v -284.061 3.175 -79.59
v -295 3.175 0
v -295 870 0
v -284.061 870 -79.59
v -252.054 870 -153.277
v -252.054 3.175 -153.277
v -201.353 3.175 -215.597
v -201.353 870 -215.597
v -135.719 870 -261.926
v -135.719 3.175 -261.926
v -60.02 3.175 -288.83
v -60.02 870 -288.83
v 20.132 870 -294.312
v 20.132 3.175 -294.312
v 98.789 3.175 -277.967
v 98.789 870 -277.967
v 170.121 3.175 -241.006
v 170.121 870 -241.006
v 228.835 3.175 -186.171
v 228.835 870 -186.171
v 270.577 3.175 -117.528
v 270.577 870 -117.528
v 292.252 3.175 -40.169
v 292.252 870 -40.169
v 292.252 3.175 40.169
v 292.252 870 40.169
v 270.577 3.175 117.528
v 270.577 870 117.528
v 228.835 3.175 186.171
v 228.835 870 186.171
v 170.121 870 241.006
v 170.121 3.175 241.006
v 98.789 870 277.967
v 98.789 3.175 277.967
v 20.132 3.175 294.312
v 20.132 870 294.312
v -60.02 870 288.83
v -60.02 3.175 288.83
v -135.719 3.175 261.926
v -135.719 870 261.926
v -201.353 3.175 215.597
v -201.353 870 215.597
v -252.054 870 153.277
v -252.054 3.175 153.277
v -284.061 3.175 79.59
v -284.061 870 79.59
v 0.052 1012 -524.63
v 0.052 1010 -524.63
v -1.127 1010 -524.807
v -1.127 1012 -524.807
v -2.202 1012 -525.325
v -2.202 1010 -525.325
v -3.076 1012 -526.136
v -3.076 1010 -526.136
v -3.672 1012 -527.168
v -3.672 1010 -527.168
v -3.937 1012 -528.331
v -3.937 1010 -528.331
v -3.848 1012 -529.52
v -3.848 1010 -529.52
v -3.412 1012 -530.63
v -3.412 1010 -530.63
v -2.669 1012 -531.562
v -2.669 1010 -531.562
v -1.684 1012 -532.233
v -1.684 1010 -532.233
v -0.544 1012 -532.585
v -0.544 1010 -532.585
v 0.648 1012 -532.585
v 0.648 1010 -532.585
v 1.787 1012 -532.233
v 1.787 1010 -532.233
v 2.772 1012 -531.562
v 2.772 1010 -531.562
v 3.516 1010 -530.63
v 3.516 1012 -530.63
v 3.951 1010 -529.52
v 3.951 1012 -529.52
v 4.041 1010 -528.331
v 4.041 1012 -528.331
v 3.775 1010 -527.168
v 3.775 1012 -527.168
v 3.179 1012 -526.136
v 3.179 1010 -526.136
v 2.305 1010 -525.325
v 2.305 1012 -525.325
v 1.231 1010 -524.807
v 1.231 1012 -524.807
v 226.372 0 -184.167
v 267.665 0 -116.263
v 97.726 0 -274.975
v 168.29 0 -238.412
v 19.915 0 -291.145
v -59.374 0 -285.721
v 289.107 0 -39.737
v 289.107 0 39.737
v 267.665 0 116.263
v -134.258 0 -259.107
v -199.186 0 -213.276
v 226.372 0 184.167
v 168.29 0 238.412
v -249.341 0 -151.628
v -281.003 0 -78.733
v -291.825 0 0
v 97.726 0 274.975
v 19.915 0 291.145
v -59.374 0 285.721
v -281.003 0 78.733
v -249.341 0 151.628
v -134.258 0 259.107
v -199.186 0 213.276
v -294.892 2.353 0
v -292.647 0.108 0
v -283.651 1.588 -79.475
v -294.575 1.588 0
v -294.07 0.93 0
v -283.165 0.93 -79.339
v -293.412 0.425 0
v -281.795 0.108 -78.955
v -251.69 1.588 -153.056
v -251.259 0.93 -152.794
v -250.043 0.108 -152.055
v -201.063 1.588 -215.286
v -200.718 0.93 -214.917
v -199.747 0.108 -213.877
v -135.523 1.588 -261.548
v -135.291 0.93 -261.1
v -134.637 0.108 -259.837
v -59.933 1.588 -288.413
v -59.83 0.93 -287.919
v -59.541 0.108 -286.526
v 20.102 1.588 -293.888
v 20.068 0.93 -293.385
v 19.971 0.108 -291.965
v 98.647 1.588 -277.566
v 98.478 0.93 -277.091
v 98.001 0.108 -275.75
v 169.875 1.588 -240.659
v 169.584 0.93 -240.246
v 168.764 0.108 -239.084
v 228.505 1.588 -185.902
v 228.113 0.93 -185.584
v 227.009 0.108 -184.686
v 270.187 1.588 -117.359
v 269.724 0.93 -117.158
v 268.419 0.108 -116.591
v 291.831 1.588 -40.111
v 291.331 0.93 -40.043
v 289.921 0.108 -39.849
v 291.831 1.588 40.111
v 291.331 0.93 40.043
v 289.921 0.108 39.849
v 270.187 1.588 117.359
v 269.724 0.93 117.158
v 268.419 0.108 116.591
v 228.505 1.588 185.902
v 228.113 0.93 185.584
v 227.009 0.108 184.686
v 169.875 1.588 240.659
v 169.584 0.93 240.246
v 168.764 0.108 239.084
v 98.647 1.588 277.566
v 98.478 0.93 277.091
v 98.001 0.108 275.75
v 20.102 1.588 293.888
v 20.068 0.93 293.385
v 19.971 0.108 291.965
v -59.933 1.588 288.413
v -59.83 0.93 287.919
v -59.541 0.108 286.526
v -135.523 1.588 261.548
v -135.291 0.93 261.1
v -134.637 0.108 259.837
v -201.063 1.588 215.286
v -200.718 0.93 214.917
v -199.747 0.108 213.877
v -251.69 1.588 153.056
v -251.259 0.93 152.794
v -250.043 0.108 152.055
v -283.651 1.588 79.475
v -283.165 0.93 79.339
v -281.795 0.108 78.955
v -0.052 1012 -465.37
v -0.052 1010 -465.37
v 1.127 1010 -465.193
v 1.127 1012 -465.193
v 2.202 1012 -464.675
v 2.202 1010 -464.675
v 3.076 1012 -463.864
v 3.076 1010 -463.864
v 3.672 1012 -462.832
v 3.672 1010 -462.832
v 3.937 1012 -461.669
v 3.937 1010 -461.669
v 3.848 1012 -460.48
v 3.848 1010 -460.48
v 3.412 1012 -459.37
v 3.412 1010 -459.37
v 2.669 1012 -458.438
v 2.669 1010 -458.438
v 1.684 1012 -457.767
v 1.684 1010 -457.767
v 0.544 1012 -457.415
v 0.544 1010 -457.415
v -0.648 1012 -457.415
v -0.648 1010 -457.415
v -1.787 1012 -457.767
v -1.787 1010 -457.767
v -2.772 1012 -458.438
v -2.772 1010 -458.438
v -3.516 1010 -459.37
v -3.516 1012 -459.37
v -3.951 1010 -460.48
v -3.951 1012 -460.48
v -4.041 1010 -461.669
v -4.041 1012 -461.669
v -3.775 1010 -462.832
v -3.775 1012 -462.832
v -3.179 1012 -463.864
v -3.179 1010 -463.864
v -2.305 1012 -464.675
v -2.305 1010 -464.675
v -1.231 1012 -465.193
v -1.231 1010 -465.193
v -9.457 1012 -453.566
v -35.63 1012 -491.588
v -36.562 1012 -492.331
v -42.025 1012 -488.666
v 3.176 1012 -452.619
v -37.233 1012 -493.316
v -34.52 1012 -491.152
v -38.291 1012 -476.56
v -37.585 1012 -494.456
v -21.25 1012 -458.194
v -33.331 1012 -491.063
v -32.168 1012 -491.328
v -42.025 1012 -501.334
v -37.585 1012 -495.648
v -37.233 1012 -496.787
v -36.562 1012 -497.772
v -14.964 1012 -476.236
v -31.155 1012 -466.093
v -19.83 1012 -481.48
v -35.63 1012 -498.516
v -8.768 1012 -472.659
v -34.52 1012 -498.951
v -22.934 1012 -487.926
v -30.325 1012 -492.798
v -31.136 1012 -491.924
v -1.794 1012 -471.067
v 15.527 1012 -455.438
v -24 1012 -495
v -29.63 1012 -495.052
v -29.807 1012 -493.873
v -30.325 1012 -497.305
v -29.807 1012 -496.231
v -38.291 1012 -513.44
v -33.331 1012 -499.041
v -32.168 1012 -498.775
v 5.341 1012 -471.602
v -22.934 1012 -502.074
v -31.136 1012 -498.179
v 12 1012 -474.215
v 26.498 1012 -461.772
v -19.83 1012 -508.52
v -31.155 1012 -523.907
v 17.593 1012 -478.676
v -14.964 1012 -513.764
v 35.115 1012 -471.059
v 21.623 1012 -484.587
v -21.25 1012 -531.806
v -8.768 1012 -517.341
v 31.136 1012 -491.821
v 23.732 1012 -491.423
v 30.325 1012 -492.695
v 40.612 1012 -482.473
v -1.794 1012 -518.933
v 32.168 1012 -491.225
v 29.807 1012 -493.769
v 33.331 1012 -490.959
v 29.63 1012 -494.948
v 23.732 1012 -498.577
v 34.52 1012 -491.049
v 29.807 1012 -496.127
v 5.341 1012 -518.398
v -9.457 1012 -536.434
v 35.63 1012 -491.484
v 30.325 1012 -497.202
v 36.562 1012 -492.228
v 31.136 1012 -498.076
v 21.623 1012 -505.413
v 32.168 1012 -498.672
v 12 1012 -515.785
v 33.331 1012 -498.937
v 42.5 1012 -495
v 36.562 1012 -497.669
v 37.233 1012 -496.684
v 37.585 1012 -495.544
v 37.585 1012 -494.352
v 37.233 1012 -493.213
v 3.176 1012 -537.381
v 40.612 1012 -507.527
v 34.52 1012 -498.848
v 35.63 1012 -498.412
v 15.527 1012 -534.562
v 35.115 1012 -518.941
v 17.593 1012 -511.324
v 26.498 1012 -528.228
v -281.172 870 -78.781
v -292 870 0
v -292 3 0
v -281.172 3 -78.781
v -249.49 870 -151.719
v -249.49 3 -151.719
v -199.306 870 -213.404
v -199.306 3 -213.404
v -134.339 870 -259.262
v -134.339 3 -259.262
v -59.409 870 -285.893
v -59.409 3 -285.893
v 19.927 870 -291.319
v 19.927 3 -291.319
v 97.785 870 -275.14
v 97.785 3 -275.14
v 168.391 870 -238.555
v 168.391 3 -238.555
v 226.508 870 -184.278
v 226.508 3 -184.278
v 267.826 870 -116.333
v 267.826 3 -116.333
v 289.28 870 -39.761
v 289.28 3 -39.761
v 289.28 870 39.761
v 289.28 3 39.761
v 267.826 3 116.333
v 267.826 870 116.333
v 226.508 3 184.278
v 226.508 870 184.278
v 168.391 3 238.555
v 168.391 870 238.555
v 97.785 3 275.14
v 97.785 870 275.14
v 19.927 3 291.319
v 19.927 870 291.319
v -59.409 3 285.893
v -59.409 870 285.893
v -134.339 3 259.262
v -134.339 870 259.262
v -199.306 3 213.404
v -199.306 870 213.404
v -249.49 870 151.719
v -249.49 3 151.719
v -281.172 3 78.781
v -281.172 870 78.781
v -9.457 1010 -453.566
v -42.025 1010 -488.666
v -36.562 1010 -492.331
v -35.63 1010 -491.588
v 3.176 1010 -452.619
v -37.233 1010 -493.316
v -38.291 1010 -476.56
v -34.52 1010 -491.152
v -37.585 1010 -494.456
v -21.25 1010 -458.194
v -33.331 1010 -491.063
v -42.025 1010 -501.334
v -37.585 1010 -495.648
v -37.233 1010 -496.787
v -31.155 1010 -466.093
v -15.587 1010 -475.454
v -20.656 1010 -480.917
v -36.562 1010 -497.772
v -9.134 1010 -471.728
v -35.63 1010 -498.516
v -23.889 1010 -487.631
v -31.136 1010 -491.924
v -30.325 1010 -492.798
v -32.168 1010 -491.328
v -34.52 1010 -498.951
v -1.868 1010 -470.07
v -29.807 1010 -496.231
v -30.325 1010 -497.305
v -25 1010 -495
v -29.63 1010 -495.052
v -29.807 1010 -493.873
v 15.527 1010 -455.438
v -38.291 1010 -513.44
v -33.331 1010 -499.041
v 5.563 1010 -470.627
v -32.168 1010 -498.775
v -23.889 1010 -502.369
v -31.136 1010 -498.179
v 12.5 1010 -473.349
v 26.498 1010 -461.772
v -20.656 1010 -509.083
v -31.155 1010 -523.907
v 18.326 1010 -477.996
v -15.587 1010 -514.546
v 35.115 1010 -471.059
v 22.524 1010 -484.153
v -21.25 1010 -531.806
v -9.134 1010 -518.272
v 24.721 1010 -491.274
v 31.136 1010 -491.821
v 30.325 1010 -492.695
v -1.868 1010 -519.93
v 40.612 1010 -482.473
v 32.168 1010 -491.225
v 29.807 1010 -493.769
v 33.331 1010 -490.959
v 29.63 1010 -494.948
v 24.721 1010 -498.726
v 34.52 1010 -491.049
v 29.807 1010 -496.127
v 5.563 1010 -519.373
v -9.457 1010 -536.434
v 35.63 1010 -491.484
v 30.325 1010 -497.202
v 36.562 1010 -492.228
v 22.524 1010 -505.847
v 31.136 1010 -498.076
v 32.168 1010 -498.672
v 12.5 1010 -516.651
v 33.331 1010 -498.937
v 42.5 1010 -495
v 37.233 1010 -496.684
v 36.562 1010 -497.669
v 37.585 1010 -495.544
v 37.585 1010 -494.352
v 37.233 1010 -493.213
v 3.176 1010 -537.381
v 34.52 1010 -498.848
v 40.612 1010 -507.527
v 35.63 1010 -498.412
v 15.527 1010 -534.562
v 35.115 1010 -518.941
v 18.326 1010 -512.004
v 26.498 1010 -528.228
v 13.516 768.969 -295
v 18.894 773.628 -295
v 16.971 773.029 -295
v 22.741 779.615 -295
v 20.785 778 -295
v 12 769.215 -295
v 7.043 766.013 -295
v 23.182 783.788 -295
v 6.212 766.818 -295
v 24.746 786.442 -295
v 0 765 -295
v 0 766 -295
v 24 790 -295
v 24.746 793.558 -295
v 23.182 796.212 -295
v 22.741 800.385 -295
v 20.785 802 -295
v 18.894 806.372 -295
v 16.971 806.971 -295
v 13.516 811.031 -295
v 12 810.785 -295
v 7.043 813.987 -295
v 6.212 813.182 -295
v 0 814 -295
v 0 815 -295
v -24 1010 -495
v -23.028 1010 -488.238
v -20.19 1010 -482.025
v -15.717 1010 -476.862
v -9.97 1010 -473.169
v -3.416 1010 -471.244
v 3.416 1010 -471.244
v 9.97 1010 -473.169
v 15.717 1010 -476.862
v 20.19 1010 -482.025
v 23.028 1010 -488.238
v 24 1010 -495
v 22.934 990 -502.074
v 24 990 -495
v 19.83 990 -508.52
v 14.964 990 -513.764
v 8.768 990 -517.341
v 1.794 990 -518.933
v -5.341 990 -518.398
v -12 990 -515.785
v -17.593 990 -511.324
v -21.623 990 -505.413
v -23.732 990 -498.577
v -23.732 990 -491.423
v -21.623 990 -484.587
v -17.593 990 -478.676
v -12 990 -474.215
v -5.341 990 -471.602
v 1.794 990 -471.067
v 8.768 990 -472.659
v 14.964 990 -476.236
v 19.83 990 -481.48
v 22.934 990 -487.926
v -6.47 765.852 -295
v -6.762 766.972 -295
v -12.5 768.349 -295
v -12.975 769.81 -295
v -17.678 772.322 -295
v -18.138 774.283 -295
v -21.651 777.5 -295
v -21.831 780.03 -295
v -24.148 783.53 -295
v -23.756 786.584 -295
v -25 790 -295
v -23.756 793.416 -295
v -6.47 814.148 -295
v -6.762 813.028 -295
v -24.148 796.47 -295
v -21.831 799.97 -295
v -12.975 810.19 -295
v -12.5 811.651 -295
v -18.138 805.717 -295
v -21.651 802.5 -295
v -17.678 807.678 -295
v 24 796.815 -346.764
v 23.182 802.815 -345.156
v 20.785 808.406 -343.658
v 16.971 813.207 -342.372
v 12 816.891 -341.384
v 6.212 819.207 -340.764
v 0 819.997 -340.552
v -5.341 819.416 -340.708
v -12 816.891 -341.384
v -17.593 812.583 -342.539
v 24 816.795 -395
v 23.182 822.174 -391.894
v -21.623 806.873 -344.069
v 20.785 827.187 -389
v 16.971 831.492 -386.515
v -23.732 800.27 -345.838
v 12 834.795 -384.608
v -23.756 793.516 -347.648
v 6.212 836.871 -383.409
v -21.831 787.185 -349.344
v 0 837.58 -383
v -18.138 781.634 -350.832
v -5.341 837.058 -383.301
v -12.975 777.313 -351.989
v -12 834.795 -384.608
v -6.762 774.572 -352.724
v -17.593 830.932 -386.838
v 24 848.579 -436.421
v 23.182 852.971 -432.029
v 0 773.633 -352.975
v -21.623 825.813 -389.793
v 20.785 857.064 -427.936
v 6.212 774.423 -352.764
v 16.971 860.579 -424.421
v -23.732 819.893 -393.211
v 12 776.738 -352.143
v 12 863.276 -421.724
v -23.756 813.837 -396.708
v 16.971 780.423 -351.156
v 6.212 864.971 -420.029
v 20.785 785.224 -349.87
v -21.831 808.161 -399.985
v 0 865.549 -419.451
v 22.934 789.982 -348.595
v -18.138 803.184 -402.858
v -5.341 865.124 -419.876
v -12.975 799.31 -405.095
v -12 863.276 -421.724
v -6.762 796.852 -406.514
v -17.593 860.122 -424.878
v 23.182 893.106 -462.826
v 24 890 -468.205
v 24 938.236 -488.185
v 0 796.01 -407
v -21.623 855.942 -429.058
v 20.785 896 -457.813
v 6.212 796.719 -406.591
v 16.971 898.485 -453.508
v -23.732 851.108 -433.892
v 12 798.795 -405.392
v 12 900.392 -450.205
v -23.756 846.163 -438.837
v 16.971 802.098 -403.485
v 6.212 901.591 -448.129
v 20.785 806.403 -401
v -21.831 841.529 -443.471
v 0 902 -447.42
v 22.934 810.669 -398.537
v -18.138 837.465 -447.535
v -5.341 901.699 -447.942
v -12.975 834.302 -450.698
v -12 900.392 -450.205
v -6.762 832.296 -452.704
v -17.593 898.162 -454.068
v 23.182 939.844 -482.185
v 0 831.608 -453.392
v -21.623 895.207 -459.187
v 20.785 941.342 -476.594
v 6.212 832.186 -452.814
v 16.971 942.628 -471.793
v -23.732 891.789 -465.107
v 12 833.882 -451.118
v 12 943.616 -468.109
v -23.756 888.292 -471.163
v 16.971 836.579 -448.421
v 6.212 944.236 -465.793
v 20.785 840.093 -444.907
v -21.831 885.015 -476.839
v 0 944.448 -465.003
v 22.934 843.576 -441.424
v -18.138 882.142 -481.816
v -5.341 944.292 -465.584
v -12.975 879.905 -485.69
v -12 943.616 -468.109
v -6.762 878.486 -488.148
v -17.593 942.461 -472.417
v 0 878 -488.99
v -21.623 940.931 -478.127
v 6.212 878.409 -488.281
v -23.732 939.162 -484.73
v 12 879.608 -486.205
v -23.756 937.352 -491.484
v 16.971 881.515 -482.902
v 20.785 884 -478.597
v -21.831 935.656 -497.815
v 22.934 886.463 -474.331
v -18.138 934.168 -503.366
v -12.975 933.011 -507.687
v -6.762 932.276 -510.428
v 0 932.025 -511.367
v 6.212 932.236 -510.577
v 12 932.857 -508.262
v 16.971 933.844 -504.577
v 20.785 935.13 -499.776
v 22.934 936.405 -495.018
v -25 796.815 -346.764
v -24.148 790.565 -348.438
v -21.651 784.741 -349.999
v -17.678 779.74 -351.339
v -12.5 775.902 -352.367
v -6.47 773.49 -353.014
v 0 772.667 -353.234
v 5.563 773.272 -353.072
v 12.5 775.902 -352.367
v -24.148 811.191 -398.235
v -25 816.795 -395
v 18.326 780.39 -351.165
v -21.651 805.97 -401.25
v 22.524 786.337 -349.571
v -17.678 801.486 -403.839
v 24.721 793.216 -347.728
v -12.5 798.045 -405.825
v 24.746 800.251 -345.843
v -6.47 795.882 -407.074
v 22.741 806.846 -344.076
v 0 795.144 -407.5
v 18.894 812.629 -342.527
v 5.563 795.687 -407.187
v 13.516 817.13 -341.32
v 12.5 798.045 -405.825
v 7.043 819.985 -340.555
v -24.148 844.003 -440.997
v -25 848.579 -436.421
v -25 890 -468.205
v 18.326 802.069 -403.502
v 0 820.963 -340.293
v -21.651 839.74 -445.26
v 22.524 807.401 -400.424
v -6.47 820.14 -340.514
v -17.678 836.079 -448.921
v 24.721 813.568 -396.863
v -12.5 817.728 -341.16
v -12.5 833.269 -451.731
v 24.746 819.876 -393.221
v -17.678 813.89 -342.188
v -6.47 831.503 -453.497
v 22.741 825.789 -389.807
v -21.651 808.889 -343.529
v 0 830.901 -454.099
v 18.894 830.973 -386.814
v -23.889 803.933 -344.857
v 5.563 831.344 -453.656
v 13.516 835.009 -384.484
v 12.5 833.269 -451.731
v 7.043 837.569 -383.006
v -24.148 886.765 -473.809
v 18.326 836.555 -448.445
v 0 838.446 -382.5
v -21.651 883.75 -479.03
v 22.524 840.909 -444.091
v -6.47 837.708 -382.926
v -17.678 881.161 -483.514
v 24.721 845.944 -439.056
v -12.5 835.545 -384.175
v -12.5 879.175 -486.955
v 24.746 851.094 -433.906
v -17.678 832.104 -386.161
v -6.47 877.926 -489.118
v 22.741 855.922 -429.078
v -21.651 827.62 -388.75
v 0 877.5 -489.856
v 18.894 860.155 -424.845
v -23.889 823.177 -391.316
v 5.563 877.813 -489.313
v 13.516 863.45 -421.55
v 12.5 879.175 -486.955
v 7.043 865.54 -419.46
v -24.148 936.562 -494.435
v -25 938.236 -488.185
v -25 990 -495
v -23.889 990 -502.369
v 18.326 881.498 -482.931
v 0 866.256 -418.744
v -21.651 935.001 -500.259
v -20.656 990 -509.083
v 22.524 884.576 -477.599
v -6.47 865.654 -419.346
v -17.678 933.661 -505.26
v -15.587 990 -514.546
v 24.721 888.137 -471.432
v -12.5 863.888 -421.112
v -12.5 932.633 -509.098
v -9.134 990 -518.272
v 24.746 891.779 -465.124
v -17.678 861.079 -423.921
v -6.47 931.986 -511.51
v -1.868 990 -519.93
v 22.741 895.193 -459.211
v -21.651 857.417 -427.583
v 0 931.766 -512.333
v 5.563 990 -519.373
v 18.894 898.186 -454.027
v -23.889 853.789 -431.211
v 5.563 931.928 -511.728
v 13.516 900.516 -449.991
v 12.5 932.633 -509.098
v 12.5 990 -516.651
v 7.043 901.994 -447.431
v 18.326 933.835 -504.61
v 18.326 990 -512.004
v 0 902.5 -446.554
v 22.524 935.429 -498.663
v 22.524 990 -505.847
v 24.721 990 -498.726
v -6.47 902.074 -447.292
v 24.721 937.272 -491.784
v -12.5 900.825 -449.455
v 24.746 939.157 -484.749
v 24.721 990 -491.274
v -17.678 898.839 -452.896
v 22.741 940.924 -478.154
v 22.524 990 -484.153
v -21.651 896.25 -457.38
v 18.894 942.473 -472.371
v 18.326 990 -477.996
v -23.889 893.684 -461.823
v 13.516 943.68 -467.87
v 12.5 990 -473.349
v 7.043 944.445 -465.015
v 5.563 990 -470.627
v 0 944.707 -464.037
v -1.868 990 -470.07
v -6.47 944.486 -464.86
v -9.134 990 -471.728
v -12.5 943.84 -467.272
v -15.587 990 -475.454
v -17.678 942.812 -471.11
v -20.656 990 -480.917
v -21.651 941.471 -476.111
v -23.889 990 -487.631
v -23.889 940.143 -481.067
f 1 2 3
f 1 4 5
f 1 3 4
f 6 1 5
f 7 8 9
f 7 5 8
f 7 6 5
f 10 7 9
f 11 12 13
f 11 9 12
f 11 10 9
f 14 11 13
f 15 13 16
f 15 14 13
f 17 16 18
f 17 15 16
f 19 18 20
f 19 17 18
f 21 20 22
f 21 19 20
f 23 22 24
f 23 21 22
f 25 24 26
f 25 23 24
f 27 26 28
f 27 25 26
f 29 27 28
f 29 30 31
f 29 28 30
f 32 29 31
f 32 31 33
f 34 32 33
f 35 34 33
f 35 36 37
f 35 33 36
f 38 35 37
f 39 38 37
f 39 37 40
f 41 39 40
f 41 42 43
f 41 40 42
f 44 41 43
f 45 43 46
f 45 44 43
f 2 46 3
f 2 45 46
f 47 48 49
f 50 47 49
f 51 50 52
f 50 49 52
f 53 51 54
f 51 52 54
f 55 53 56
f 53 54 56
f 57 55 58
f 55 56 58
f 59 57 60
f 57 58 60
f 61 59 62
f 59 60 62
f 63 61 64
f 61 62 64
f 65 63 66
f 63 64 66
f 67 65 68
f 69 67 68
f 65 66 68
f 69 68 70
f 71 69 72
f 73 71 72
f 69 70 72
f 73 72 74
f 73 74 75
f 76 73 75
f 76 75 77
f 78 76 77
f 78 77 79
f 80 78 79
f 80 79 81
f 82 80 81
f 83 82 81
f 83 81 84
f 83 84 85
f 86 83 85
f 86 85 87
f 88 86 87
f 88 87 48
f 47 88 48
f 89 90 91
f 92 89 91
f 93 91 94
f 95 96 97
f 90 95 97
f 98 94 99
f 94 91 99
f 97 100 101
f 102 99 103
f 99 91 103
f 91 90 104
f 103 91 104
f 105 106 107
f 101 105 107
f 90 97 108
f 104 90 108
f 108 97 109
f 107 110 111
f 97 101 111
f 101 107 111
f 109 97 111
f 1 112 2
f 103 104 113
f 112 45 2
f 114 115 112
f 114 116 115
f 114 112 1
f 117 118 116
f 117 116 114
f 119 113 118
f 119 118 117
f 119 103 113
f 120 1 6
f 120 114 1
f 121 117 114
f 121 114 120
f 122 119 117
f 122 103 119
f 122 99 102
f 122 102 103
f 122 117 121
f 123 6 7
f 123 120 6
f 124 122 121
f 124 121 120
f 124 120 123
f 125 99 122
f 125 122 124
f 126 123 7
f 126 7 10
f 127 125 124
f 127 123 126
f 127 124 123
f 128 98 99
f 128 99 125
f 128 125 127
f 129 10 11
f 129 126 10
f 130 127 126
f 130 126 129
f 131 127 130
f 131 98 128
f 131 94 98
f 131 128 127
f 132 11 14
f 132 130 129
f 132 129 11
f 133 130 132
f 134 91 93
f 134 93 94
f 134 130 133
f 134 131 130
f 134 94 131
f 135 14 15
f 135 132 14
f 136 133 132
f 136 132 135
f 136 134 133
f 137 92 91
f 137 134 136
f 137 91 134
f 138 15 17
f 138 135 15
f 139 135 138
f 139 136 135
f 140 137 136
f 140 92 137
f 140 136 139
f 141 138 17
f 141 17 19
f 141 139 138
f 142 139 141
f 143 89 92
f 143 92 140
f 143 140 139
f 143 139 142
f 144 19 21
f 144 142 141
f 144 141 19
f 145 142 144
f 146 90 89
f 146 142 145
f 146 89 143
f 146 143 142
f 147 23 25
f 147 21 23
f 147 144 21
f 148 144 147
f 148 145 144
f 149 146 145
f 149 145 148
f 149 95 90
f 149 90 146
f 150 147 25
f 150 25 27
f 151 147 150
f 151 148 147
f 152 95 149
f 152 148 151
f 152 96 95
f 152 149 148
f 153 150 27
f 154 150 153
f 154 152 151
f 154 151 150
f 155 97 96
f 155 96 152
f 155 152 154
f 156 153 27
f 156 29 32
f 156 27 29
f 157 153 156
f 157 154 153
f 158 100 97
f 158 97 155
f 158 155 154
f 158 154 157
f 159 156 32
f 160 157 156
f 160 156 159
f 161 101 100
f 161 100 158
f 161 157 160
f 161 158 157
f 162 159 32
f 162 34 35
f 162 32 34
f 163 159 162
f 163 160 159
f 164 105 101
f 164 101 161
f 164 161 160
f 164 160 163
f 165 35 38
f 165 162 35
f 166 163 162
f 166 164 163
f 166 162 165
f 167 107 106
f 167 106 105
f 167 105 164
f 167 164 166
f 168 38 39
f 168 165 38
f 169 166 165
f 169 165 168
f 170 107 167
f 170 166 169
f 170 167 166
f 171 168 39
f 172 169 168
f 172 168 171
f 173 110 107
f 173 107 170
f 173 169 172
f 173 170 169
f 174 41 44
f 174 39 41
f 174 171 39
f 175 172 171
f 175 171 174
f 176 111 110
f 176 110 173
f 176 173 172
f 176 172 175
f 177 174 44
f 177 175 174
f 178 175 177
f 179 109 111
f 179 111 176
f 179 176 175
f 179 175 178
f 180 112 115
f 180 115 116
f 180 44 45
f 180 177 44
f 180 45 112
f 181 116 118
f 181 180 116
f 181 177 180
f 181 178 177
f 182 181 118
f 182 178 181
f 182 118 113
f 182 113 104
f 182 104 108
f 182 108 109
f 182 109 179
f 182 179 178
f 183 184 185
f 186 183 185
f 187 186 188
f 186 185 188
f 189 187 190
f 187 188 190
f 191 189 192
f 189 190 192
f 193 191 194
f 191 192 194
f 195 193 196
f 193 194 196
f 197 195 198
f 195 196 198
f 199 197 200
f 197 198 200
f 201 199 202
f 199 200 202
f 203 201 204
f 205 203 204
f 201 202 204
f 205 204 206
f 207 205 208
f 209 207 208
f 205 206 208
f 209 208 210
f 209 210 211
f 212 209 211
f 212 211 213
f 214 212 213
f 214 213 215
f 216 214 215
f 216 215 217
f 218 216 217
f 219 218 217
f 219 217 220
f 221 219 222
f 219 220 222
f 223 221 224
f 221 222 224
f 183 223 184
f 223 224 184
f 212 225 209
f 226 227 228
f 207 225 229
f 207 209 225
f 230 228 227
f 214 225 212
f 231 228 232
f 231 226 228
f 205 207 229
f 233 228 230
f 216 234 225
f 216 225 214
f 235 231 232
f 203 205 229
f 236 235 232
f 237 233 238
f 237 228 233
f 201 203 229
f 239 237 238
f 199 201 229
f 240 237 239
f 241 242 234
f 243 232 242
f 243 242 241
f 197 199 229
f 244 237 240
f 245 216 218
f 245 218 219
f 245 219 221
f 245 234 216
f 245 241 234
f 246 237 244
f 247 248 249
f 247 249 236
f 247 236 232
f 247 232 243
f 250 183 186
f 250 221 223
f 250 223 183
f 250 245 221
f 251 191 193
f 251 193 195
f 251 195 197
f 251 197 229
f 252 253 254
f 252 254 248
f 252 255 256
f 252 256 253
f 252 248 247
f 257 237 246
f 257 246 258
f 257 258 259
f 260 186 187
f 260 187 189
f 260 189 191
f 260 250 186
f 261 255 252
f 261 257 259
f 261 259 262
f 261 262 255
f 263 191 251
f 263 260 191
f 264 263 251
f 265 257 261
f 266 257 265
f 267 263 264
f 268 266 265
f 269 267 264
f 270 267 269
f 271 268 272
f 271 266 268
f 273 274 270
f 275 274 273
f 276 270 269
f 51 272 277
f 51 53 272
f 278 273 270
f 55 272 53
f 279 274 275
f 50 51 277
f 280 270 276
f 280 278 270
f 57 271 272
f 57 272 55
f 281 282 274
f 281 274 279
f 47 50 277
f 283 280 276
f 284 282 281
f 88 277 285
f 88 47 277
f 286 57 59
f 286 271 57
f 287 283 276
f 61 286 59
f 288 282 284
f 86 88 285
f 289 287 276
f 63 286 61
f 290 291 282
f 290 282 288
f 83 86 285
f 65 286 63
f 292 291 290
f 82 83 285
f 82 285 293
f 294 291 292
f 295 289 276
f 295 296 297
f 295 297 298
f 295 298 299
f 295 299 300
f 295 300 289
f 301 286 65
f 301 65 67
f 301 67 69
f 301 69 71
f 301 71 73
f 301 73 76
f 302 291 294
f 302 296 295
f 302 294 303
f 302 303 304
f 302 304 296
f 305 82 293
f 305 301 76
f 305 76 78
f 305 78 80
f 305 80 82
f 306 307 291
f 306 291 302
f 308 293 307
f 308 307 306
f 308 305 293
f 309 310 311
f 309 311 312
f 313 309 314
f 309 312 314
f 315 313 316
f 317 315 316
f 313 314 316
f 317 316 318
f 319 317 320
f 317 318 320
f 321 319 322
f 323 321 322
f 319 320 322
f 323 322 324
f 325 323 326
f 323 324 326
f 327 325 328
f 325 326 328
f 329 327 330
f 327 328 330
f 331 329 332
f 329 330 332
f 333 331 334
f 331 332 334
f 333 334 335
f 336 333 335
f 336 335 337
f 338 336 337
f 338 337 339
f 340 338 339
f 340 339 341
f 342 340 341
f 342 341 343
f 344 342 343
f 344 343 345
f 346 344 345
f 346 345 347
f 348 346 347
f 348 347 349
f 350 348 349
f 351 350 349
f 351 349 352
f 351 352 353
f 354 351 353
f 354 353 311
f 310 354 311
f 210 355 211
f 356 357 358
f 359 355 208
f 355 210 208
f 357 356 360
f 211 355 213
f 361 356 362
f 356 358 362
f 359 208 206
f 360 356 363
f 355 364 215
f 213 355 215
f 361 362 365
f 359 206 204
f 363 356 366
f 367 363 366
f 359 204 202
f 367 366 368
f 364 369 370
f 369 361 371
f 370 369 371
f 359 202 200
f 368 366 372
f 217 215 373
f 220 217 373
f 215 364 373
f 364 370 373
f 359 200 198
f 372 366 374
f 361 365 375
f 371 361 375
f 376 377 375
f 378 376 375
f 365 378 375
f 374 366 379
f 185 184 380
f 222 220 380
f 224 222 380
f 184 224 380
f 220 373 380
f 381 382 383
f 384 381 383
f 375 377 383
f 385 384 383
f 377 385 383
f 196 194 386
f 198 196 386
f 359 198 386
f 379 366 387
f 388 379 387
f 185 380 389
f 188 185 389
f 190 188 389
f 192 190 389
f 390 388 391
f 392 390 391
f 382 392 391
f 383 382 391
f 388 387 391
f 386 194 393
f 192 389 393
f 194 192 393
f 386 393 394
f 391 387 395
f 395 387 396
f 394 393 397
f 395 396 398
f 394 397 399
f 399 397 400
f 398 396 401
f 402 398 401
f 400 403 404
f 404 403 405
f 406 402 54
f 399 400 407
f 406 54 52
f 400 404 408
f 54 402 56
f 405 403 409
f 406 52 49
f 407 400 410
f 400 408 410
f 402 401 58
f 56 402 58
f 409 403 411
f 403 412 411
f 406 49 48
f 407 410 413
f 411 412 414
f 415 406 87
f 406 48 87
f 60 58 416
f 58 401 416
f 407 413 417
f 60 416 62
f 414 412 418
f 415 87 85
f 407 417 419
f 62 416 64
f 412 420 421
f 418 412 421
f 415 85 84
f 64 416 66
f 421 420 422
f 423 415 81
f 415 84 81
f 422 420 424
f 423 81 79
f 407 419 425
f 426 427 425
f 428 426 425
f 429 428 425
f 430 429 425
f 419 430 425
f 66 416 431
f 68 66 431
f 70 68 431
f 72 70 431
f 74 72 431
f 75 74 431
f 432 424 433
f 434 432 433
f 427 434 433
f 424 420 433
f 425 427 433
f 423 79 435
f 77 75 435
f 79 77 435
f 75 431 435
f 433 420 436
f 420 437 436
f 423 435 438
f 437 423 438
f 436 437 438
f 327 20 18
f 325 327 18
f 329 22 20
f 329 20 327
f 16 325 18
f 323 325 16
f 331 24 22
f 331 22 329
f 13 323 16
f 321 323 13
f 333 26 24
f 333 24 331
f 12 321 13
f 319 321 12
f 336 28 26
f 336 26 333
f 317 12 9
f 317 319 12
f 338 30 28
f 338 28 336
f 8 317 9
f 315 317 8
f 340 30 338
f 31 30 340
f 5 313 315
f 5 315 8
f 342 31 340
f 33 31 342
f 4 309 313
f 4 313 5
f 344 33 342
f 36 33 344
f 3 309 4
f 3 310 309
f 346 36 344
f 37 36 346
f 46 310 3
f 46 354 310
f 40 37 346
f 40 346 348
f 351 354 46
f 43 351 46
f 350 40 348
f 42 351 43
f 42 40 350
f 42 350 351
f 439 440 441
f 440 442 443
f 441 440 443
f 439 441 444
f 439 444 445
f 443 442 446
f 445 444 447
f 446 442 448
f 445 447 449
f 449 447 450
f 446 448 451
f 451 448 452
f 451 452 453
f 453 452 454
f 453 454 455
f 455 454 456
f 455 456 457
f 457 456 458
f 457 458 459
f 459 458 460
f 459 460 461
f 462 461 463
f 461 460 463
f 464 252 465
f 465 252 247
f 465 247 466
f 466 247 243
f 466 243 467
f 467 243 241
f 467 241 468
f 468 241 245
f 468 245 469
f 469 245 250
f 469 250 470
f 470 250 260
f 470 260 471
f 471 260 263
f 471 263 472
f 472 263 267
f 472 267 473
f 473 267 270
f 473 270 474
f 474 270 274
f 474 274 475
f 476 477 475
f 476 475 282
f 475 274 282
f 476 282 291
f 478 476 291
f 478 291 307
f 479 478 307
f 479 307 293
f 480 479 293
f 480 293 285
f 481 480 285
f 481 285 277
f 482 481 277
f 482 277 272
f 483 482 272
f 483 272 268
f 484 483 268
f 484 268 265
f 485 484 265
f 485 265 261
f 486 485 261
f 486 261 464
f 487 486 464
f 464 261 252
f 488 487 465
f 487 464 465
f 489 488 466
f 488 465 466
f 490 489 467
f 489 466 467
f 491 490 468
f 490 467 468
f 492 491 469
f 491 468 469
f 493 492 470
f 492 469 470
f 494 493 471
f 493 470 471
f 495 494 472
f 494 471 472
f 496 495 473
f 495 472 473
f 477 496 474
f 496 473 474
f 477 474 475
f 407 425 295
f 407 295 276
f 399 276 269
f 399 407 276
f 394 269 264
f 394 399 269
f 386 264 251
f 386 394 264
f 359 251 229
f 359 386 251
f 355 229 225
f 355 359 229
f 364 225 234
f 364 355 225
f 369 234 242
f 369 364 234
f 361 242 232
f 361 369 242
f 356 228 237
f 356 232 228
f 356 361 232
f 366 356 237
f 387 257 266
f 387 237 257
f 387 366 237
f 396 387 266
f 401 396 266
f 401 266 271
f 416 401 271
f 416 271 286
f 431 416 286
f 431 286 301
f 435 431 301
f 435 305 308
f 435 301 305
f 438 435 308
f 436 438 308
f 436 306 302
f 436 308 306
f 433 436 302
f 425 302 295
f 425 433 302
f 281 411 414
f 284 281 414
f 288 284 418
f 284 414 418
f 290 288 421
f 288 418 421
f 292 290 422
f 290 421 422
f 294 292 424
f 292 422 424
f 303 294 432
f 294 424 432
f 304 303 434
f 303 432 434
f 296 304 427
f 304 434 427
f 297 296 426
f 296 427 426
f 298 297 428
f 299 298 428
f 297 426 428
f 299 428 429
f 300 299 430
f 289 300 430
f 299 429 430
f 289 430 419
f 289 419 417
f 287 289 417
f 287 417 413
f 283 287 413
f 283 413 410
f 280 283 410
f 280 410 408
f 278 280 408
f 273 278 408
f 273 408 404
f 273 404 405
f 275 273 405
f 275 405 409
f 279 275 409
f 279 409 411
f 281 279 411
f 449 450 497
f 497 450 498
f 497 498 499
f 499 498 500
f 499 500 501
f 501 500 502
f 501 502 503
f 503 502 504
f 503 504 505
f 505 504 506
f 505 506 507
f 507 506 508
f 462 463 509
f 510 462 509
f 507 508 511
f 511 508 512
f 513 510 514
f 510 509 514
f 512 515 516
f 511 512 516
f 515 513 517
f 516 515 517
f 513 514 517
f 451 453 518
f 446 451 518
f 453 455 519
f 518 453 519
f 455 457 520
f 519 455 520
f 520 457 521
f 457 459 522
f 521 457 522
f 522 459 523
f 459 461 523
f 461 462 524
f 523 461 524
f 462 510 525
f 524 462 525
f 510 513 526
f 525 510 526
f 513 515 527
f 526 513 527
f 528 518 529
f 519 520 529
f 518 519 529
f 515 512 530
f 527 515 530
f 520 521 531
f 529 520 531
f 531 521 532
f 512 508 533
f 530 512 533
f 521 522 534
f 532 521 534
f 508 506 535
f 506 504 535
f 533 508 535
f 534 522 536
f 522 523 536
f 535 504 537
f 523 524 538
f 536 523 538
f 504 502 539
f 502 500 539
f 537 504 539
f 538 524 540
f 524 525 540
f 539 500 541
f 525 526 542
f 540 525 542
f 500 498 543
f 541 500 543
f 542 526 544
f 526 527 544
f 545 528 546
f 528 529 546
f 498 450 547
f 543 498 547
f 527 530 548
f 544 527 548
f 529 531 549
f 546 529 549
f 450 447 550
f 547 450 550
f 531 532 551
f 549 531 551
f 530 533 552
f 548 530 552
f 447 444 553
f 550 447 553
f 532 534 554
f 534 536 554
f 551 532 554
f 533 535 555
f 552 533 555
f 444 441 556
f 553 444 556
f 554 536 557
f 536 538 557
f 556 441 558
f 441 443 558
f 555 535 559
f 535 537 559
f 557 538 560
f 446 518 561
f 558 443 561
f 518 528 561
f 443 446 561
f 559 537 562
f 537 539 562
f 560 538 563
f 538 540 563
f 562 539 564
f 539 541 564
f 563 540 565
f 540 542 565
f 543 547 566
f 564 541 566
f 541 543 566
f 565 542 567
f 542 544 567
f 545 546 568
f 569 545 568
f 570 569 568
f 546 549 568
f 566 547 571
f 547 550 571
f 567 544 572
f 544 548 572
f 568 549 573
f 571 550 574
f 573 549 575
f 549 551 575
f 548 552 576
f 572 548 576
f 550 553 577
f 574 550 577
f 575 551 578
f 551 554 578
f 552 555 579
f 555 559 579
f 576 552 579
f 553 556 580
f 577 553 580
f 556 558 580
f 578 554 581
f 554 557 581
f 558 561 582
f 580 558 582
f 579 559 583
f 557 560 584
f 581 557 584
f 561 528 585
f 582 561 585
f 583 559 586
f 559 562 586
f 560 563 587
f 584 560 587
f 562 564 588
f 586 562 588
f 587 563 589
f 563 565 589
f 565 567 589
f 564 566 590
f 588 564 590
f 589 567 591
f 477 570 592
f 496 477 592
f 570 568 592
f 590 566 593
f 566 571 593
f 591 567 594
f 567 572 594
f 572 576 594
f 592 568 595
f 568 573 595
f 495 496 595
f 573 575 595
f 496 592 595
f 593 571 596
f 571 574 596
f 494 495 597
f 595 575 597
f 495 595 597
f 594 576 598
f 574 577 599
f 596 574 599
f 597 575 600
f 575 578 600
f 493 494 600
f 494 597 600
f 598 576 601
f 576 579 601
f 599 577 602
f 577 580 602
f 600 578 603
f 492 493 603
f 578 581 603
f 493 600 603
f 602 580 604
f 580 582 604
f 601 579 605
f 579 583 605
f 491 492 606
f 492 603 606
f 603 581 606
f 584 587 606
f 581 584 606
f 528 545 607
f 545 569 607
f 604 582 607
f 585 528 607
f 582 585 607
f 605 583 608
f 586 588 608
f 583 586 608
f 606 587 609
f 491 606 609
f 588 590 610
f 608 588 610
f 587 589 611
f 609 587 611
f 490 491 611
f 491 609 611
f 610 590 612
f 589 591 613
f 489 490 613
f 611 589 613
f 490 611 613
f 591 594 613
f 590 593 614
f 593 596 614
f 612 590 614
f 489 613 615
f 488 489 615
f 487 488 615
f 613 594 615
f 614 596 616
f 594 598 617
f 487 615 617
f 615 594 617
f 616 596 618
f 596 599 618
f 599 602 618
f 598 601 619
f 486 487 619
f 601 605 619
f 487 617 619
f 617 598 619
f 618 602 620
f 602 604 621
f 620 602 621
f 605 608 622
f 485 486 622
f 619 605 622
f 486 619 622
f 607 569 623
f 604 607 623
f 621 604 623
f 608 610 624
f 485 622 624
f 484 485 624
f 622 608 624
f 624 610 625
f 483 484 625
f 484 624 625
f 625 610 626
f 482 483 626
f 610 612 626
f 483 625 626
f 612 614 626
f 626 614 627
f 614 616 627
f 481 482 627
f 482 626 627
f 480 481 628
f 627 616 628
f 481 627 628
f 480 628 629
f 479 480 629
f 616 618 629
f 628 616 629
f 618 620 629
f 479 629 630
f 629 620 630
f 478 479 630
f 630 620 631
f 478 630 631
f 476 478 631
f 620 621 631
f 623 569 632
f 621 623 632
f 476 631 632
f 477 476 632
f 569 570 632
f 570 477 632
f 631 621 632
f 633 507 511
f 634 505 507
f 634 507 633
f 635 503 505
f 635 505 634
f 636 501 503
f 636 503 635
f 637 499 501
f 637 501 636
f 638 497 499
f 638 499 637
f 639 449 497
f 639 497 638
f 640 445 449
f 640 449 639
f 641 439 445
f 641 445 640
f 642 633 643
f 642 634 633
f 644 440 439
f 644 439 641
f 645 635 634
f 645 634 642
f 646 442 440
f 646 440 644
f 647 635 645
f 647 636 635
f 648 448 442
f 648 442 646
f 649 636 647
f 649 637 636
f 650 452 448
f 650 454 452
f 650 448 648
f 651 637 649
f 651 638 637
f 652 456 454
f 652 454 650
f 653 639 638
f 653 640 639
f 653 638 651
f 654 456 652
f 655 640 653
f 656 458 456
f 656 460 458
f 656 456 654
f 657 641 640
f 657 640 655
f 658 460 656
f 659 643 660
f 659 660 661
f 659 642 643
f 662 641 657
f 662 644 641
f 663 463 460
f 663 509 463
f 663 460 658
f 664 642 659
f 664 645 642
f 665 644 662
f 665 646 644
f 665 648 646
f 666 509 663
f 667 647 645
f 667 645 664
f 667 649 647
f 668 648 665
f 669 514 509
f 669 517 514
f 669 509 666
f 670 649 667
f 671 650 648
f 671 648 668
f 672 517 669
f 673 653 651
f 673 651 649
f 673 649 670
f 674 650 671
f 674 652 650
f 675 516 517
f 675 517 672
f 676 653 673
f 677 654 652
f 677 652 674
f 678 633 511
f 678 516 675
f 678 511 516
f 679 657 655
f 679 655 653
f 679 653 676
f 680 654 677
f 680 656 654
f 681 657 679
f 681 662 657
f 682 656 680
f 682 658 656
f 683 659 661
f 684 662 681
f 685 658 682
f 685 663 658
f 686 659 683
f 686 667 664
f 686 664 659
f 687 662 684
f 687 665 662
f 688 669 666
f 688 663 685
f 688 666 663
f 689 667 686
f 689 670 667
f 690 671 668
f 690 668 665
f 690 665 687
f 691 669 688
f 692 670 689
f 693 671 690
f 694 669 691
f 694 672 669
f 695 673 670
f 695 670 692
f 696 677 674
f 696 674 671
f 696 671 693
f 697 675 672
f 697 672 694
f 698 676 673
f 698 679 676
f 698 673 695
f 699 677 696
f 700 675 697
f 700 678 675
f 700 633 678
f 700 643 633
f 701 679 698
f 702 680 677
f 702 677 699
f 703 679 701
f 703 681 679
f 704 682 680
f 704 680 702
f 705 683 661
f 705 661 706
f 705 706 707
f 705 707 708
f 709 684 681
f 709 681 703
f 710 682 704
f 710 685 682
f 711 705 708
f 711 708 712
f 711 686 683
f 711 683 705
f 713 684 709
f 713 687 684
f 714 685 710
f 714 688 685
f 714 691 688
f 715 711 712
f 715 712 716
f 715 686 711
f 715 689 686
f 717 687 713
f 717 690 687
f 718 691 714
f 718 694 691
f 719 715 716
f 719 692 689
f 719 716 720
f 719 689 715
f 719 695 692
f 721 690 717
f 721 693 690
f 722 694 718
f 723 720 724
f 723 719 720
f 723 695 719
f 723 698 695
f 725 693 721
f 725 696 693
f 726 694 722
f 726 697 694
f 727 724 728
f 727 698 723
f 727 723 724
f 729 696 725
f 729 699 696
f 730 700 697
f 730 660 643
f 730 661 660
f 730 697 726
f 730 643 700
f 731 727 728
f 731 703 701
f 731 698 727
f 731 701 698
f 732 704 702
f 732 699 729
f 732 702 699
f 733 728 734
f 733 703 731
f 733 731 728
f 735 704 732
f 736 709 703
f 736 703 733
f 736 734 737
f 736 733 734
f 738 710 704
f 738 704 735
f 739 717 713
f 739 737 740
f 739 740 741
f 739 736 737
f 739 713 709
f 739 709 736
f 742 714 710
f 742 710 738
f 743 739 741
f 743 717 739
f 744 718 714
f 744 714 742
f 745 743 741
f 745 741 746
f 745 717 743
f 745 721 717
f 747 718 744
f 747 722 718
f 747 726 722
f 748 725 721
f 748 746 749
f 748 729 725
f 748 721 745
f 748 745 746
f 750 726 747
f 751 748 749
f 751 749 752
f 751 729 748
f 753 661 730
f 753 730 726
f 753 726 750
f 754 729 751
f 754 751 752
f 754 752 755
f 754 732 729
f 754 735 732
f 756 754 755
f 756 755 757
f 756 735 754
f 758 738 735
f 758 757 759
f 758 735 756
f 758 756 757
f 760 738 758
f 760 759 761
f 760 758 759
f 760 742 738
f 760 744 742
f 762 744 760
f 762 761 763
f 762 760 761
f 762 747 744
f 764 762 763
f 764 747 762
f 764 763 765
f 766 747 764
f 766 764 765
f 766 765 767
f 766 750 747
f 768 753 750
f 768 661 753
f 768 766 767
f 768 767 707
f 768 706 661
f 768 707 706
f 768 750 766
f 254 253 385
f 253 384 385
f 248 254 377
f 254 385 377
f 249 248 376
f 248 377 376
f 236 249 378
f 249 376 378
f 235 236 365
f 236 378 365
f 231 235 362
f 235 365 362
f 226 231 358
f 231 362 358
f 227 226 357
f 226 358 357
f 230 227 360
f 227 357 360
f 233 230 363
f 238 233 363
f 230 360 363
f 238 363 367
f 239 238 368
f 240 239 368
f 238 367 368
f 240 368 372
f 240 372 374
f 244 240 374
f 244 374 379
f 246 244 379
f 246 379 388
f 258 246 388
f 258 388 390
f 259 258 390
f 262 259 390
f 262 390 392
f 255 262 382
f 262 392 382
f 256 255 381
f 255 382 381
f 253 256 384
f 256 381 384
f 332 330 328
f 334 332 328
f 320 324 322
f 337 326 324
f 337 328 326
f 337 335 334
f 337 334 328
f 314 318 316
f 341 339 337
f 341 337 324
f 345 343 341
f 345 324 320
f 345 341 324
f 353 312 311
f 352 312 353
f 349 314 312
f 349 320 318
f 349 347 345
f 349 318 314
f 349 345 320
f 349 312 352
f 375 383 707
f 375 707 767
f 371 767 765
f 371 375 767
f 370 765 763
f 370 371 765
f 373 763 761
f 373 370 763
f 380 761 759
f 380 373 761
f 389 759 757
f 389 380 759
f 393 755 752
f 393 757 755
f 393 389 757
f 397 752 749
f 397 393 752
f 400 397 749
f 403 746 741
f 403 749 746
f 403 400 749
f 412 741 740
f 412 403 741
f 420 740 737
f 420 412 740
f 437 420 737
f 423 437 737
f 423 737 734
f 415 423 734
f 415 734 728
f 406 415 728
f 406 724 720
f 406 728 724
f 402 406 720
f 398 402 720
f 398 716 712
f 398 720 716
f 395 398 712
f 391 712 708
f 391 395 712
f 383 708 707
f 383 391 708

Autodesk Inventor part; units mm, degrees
ref_plane "YZ Plane" through (0, 0, 0) normal (1, 0, 0) x (0, 1, 0)
ref_plane "XZ Plane" through (0, 0, 0) normal (0, 1, 0) x (-1, 0, 0)
ref_plane "XY Plane" through (0, 0, 0) normal (0, 0, 1) x (1, 0, 0)
sketch "Sketch1" plane through (0, 0, 0) normal (0, 1, 0) x (-1, 0, 0)
  circle A0 centre (0, 0) radius 295
  dimension "d0" = 590
extrude "Extrusion1" add sketch "Sketch1" along normal blind 870
shell "Shell1" thickness 3 removed faces 1 at (-9.963, 870, -139.7076)
sketch "Sketch2" plane through (0, 0, 0) normal (1, 0, 0) x (0, 1, 0)
  line L0 (990, -495) -> (1010, -495)
  line L1 (870, -295) -> (870, 295) projected
  line L2 (870, -295) -> (670, -295)
  line L3 (0, -295) -> (870, -295) projected
  arc A0 (790, -295) -> (990, -495) centre (990, -295) ccw
  line L4 (3, -292) -> (870, -292) projected
  line L5 (790, -295) -> (840.8, -295)
  line L6 (790.0347, -291.2721) -> (790, -291.2721)
  line L7 (790, -292) -> (790, -291.2721)
  line L8 (790, -295) -> (790, -280.1792)
  point P0 (0, 0)
  point P1 (790, -495)
  dimension "d5" = 200
  dimension "d6" = 200
  dimension "d7" = 220
  dimension "d8" = 200
  dimension "d16" = 50.8
ref_plane "Work Plane1" through (0, 1010, -495) normal (0, 1, 0) x (-1, 0, 0)
sketch "Sketch3" plane through (0, 1010, -495) normal (0, 1, 0) x (-1, 0, 0)
  circle A0 centre (0, 0) radius 25
  point P0 (0, 495)
  dimension "d9" = 50
sweep "Sweep1" add profiles "Sketch3" path "Sketch2" path curves L0 A0
sketch "Sketch4" plane through (0, 1010, -495) normal (0, 1, 0) x (1, 0, 0)
  circle A0 centre (0, 0) radius 25 projected
  circle A1 centre (0, 0) radius 24
  point P0 (0, -495)
  dimension "d13" = 48
sweep "Sweep2" cut profiles "Sketch4" path "Sketch2" path curves L0 A0 contours A1
sketch "Sketch5" plane through (0, 1010, -495) normal (0, 1, 0) x (1, 0, 0)
  circle A0 centre (0, 0) radius 42.5
  point P0 (0, -495)
  dimension "d17" = 85
extrude "Extrusion2" add sketch "Sketch5" along normal blind 2
sketch "Sketch6" plane through (0, 1010, -495) normal (0, 1, 0) x (-1, 0, 0)
  circle A0 centre (0, 0) radius 24
  point P0 (0, 495)
  dimension "d20" = 48
extrude "Extrusion3" cut sketch "Sketch6" against normal mid plane 5
sketch "Sketch7" plane through (0, 1012, -495) normal (0, 1, 0) x (1, 0, 0)
  circle A0 centre (0, 0) radius 42.5 projected
  point P0 (0, -495)
  point P1 (0.0517, 33.6296)
  dimension "d30" = 33.6296
hole "Hole1" at (0.0517, 1012, -528.6296) direction (0, -1, 0) diameter 8 depth 10 tip angle 118
pattern_circular "Circular Pattern1" count 4 over 360 about axis through (0, 1010, -495) along (0, -1, 0) of "Hole1"
fillet "Fillet1" radius 3.175 1 edges at (295, 0, 0)
properties part number "still" material "Gold"
